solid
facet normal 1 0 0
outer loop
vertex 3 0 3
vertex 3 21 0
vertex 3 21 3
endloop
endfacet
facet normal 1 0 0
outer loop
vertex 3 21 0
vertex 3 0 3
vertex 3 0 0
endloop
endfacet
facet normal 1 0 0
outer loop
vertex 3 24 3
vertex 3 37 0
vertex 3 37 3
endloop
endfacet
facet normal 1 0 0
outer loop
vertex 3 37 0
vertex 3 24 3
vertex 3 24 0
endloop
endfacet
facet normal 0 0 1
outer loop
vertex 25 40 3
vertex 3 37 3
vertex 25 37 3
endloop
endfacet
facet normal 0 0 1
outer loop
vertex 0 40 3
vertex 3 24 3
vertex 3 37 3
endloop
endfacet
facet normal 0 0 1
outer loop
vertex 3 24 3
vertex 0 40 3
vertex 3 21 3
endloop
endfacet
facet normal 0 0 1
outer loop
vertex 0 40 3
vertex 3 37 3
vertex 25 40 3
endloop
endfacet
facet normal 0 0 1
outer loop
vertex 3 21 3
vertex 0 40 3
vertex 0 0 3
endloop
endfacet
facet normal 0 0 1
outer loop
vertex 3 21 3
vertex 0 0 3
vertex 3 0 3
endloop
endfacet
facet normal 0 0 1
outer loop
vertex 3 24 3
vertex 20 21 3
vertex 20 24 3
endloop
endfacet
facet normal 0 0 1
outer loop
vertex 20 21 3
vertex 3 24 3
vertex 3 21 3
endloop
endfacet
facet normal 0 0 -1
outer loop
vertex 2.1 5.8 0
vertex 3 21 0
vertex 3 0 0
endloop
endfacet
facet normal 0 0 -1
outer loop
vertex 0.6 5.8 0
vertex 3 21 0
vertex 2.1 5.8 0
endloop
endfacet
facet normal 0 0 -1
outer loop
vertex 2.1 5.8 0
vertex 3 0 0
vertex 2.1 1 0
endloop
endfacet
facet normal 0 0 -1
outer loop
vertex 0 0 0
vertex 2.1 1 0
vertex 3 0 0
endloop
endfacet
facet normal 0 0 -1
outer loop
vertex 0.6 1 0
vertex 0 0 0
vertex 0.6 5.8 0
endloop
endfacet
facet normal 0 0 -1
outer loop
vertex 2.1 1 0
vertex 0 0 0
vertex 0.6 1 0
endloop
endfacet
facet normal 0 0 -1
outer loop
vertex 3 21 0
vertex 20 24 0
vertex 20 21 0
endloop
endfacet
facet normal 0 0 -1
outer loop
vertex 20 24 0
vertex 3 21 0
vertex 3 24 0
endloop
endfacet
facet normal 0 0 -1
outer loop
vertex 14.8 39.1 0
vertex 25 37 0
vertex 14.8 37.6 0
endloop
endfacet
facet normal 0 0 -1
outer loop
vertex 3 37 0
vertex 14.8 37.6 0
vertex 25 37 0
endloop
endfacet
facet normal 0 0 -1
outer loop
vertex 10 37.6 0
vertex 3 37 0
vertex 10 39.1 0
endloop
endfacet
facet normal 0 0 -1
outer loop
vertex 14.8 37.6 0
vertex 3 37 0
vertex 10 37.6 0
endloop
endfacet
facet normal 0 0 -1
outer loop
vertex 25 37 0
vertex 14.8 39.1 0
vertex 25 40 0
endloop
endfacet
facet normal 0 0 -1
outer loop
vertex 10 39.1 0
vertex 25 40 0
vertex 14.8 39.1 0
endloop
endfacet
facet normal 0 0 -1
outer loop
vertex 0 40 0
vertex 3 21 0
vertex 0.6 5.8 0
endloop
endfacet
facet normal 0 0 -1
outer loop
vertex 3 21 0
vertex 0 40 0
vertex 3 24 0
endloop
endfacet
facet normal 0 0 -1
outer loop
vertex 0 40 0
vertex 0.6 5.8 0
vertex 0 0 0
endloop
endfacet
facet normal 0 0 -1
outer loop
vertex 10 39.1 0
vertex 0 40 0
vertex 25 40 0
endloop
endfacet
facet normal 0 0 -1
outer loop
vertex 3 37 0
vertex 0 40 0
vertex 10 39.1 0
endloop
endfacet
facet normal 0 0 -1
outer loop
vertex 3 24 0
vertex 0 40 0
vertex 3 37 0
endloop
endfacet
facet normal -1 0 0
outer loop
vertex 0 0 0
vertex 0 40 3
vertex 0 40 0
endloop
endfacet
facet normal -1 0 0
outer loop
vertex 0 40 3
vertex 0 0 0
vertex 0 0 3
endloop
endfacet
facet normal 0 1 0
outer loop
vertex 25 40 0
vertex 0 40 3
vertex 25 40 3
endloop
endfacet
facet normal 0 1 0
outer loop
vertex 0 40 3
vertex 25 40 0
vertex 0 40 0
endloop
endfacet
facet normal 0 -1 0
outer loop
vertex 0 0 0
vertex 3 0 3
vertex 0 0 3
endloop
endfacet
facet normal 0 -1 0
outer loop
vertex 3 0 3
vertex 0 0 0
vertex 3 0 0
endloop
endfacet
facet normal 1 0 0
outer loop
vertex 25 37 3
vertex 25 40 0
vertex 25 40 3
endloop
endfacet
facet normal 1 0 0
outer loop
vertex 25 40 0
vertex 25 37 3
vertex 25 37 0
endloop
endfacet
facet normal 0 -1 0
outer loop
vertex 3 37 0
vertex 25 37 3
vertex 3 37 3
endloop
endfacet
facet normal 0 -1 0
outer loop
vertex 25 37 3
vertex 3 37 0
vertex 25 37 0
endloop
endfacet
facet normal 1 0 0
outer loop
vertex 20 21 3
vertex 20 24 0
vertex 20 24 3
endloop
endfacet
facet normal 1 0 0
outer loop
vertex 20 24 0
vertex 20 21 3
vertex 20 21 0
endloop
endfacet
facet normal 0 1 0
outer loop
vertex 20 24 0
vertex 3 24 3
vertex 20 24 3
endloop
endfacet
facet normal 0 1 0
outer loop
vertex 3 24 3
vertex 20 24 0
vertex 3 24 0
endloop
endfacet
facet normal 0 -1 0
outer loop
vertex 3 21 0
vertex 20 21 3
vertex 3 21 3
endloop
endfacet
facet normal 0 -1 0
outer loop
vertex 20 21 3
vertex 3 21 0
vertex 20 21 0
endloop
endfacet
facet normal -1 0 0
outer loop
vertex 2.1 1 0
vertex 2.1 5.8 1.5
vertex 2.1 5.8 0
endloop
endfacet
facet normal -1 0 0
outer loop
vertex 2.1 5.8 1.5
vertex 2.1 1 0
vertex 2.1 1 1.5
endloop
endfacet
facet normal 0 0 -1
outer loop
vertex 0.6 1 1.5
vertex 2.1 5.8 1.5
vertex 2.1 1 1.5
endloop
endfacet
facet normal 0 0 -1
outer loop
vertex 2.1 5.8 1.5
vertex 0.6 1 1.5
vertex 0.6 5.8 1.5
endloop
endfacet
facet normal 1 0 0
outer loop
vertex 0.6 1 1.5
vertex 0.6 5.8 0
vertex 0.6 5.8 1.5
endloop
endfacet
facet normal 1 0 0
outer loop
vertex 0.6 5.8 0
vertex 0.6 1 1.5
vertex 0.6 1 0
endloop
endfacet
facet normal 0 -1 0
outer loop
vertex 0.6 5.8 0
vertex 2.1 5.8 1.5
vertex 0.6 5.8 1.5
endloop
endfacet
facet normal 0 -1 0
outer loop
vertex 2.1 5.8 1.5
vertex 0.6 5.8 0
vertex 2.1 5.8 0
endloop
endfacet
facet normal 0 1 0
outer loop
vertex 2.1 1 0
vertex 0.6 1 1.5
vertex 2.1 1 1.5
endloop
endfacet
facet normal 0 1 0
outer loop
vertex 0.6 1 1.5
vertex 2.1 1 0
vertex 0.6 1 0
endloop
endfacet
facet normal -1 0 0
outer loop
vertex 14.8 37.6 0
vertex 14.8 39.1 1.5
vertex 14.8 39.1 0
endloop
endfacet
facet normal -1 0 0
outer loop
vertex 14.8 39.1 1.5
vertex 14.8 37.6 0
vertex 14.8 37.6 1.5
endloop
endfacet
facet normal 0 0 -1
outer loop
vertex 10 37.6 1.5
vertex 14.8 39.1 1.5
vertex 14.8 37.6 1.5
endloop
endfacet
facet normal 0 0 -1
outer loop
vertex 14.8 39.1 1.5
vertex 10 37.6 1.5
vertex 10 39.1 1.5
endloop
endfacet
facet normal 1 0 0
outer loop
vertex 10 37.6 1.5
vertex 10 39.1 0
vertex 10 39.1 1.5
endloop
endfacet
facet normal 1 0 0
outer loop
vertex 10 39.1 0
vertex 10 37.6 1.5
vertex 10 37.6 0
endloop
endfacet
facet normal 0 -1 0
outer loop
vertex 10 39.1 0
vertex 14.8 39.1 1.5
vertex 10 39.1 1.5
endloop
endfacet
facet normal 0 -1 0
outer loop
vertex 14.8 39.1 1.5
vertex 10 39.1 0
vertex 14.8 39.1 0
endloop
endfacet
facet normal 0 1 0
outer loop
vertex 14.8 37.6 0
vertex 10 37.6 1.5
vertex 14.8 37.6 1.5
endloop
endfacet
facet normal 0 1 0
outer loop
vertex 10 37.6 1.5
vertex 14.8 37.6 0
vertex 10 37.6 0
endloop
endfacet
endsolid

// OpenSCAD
difference(){
 union(){
  cube([3,40,3]);
  translate([0,37,0]) cube([25,3,3]);
  translate([0,21,0]) cube([20,3,3]);
}
 translate([0.6,1,0]) cube([1.5,4.8,1.5]);
 translate([10,37.6,0]) cube([4.8,1.5,1.5]);

}
